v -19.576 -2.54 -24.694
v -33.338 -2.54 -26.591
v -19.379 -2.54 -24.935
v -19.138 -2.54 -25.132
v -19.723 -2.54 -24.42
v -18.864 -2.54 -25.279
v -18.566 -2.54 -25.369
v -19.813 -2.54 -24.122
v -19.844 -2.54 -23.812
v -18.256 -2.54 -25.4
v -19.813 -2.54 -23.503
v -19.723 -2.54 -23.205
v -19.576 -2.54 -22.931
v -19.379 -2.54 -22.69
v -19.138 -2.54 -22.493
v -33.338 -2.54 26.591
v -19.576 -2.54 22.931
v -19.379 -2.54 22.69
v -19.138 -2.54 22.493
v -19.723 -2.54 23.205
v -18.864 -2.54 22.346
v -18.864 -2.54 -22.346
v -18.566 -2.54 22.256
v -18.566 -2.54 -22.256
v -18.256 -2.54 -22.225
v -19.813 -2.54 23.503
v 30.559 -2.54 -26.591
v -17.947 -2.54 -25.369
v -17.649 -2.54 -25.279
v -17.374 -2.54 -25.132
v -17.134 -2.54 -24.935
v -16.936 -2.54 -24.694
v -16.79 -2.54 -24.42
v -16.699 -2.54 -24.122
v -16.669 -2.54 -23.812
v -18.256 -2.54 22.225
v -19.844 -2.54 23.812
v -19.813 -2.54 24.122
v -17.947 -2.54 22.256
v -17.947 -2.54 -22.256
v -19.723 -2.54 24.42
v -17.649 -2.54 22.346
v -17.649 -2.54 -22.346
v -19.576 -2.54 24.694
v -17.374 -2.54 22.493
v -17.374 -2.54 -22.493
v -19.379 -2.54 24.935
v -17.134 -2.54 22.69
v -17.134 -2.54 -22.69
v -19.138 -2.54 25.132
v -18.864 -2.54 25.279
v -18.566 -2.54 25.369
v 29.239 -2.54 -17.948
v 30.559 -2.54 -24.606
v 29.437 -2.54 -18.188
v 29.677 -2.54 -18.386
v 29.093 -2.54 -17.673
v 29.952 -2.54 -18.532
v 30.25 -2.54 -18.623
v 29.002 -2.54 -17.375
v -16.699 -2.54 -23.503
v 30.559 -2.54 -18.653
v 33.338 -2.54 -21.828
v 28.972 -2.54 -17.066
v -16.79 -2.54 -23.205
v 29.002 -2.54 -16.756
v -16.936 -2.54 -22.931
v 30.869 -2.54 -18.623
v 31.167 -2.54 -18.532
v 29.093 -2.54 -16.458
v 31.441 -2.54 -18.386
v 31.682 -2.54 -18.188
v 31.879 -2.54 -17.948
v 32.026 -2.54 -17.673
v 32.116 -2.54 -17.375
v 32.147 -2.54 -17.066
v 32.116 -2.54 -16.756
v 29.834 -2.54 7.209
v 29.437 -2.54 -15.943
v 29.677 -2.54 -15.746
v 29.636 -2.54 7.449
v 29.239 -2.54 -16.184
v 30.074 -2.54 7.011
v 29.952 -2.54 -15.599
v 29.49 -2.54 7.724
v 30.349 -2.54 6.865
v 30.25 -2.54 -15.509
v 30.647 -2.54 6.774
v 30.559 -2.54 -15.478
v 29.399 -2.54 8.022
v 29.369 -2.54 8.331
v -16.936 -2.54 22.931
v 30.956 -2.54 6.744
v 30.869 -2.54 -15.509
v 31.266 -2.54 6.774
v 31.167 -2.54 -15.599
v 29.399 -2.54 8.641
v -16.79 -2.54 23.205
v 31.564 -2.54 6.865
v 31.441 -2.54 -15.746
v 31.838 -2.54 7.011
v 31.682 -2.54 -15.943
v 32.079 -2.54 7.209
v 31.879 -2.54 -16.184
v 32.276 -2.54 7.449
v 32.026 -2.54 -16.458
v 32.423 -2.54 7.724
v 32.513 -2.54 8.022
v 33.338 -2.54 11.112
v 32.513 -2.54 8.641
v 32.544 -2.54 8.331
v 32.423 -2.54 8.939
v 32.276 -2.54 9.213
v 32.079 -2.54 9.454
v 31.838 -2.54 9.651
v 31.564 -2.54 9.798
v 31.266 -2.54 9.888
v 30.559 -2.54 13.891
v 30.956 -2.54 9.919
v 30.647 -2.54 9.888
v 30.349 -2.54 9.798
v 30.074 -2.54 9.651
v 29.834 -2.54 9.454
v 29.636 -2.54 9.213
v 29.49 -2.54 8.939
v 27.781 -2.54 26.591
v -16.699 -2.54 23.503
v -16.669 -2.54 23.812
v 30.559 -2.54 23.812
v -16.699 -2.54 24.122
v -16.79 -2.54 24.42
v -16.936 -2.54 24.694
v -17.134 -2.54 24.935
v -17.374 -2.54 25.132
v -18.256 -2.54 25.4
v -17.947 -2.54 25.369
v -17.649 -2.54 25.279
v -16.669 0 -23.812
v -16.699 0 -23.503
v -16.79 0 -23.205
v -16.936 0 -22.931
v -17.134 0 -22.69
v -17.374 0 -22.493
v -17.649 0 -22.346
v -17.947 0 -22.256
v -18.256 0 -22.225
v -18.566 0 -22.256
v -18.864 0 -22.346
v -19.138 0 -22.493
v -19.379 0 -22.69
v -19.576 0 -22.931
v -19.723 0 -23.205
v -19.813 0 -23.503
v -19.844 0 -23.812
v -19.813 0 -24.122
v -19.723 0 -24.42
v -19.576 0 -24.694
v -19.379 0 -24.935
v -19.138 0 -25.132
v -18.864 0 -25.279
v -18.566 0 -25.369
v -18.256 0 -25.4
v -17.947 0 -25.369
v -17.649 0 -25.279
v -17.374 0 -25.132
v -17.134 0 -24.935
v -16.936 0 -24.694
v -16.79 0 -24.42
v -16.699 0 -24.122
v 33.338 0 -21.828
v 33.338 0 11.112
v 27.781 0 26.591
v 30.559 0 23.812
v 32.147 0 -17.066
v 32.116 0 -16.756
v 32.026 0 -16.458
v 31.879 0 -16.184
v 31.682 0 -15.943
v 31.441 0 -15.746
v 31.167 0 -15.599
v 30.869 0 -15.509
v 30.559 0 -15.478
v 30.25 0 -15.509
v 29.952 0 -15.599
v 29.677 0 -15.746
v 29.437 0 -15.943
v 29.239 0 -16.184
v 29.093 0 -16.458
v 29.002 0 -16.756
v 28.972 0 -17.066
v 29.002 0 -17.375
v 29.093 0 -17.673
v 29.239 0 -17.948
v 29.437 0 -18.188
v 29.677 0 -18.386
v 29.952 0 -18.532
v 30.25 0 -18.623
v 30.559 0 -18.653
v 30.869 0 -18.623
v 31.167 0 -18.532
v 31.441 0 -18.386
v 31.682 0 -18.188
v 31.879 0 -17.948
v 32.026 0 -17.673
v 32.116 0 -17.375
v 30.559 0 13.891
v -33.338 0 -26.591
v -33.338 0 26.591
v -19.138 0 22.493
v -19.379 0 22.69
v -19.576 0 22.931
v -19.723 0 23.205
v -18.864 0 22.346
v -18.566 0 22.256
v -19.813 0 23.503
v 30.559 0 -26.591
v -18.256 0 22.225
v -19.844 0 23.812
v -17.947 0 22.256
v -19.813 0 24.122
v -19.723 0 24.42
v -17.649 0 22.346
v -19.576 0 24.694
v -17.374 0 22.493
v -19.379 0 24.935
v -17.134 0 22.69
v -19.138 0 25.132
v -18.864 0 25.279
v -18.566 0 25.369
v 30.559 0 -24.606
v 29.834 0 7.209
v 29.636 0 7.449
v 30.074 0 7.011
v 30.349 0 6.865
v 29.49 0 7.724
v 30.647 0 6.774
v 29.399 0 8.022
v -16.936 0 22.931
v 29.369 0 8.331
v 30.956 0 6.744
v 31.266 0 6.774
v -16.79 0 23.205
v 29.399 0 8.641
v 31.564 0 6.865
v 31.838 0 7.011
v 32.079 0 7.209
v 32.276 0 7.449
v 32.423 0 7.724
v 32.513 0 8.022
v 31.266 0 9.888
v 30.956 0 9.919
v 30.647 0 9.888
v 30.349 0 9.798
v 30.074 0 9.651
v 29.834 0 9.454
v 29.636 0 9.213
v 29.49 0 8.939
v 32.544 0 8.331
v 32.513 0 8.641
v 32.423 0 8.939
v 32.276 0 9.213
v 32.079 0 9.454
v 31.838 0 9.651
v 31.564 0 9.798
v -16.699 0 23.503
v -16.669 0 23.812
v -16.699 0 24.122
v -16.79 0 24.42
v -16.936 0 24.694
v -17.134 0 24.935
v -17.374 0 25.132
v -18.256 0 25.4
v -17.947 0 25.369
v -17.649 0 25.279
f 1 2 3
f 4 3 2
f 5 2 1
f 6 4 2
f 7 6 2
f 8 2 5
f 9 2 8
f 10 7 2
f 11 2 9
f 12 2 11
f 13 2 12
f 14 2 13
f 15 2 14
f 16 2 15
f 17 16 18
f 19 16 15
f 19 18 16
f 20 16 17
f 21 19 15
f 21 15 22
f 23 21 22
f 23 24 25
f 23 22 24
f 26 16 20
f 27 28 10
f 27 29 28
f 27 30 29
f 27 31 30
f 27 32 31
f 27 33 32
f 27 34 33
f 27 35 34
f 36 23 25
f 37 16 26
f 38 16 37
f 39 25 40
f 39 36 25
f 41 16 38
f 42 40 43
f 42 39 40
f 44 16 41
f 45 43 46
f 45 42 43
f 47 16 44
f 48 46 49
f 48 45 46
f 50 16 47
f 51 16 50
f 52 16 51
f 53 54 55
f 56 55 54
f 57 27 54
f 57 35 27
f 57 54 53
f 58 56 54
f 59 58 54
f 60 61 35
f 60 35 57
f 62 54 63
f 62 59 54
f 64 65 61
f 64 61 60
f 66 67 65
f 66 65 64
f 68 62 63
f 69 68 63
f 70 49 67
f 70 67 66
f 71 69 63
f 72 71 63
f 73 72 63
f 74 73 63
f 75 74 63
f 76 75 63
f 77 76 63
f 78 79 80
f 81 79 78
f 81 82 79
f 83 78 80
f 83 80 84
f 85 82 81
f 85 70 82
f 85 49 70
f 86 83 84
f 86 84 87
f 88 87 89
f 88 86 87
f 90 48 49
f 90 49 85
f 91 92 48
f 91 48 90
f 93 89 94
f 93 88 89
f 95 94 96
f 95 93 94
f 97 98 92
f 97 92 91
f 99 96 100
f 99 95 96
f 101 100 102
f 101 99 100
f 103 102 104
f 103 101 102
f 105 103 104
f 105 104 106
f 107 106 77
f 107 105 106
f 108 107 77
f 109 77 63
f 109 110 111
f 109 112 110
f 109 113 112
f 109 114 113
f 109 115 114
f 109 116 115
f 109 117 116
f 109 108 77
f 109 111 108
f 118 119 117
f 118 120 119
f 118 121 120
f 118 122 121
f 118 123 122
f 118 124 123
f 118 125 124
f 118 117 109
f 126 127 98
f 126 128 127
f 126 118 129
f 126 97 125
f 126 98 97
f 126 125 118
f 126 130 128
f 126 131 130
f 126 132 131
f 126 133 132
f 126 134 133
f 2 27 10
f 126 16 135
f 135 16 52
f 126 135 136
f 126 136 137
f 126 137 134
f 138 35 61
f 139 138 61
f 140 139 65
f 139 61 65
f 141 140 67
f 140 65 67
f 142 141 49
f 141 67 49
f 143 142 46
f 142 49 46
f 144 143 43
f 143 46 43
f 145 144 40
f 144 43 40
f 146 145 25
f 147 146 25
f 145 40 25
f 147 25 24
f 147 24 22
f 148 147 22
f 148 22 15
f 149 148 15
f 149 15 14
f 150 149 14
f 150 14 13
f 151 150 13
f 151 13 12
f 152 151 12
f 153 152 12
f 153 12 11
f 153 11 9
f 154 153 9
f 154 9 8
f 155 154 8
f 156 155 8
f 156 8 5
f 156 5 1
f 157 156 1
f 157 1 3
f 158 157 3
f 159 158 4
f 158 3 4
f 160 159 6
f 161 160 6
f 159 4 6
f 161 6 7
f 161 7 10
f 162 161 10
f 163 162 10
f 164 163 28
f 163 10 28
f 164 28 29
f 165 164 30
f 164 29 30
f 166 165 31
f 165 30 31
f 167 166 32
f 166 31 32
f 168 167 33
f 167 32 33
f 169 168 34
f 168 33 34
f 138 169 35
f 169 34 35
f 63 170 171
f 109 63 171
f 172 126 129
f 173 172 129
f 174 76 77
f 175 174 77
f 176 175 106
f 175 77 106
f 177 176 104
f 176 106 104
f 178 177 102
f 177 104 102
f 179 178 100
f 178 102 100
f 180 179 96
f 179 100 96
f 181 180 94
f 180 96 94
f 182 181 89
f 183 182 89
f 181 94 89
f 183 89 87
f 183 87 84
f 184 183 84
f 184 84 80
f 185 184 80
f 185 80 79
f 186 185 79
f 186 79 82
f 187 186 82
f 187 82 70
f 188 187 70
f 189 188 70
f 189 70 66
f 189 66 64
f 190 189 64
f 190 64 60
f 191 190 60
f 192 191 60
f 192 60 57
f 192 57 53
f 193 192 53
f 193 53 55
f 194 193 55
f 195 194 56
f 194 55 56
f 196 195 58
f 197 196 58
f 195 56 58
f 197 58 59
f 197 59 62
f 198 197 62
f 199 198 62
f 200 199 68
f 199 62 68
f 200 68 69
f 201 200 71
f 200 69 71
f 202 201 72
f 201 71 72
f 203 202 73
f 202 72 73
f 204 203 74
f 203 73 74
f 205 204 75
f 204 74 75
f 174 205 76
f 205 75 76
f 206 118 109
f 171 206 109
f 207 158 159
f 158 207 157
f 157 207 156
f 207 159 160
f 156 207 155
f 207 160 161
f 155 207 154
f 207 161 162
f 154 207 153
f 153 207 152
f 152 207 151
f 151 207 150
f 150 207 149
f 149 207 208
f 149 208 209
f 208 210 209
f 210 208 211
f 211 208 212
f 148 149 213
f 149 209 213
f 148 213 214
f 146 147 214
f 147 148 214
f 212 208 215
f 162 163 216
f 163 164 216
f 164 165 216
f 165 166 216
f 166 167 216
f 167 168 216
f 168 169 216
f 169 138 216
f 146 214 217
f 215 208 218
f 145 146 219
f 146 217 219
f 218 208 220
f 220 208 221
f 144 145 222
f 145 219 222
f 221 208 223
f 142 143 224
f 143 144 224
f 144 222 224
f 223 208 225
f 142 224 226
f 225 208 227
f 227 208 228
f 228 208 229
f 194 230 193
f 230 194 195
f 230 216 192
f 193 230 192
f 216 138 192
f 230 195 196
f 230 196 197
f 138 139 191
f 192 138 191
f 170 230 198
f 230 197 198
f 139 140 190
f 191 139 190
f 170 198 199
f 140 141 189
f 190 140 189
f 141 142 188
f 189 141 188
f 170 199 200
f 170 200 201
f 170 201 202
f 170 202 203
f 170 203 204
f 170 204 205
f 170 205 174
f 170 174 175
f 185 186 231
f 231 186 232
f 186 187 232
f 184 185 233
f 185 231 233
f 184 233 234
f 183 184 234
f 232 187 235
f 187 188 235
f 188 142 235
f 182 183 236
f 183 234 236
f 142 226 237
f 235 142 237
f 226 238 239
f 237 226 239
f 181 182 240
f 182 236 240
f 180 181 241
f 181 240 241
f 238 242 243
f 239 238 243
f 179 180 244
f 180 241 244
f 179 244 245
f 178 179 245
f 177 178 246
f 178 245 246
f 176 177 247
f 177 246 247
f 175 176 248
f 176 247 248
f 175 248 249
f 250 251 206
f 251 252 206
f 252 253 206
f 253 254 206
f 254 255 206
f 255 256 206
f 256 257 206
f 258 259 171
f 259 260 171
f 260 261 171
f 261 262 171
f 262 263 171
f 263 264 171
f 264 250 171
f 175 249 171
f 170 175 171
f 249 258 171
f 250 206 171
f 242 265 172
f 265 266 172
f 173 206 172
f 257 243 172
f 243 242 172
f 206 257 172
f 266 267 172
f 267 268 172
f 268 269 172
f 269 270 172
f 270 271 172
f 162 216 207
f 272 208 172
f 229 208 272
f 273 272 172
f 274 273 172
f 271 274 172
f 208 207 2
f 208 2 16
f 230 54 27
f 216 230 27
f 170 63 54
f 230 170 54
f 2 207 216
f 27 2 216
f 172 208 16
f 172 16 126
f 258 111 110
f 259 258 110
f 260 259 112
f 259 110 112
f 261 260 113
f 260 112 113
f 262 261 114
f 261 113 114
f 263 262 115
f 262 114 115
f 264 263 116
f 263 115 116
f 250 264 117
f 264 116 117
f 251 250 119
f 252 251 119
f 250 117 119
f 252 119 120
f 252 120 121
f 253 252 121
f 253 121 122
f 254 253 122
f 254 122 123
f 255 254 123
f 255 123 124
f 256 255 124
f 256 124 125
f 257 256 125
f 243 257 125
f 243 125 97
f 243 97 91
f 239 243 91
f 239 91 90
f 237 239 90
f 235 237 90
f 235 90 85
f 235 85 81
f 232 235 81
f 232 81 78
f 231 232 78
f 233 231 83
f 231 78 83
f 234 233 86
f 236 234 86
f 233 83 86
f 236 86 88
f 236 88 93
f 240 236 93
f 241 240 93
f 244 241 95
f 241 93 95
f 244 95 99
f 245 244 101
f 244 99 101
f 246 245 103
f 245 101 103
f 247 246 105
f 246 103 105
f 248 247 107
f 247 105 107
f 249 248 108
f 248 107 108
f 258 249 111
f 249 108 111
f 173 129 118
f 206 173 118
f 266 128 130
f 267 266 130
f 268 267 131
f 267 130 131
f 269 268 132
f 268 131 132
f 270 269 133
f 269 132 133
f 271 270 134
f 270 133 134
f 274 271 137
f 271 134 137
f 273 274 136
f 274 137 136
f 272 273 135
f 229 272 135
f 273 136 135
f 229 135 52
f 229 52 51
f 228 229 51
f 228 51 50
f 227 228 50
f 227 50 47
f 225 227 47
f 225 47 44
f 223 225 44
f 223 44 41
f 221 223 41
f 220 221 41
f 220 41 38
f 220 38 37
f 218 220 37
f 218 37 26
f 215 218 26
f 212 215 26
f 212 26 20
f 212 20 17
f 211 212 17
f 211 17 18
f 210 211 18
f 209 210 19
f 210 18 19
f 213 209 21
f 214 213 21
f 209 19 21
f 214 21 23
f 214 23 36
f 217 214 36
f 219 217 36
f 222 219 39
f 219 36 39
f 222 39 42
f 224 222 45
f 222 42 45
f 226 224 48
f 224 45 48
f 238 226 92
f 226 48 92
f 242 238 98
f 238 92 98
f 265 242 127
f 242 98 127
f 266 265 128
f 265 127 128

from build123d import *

# Parameters (mm, degrees)
F0_W     = 66.675
F0_H     = 53.18125
F1_DEPTH = 2.54
F3_DEPTH = 25.4
F4_R     = 1.5875
F5_DEPTH = 25.4


with BuildPart() as f1:
    # F0 (on Front) → F1 (new body)
    with BuildSketch(Plane.XZ):
        Rectangle(F0_W, F0_H)
    extrude(amount=F1_DEPTH)

    # F2 (on face) → F3 (cut)
    with BuildSketch(Plane.XZ.offset(2.54)):
        Polygon((33.3375, 26.590625), (27.78125, 26.590625), (30.559375, 23.8125), (30.559375, 13.890625), (33.3375, 11.1125), align=None)
        Polygon((33.3375, -26.590625), (33.3375, -21.828125), (30.559375, -24.60625), (30.559375, -26.590625), align=None)
    extrude(amount=-F3_DEPTH, mode=Mode.SUBTRACT)

    # F4 (on face) → F5 (cut)
    with BuildSketch(Plane.XZ.offset(2.54)):
        with Locations((30.95625, 8.331274)):
            Circle(F4_R)
        with Locations((30.559375, -17.065625)):
            Circle(F4_R)
        with Locations((-18.25625, -23.8125)):
            Circle(F4_R)
        with Locations((-18.25625, 23.8125)):
            Circle(F4_R)
    extrude(amount=-F5_DEPTH, mode=Mode.SUBTRACT)


solid = f1.part
